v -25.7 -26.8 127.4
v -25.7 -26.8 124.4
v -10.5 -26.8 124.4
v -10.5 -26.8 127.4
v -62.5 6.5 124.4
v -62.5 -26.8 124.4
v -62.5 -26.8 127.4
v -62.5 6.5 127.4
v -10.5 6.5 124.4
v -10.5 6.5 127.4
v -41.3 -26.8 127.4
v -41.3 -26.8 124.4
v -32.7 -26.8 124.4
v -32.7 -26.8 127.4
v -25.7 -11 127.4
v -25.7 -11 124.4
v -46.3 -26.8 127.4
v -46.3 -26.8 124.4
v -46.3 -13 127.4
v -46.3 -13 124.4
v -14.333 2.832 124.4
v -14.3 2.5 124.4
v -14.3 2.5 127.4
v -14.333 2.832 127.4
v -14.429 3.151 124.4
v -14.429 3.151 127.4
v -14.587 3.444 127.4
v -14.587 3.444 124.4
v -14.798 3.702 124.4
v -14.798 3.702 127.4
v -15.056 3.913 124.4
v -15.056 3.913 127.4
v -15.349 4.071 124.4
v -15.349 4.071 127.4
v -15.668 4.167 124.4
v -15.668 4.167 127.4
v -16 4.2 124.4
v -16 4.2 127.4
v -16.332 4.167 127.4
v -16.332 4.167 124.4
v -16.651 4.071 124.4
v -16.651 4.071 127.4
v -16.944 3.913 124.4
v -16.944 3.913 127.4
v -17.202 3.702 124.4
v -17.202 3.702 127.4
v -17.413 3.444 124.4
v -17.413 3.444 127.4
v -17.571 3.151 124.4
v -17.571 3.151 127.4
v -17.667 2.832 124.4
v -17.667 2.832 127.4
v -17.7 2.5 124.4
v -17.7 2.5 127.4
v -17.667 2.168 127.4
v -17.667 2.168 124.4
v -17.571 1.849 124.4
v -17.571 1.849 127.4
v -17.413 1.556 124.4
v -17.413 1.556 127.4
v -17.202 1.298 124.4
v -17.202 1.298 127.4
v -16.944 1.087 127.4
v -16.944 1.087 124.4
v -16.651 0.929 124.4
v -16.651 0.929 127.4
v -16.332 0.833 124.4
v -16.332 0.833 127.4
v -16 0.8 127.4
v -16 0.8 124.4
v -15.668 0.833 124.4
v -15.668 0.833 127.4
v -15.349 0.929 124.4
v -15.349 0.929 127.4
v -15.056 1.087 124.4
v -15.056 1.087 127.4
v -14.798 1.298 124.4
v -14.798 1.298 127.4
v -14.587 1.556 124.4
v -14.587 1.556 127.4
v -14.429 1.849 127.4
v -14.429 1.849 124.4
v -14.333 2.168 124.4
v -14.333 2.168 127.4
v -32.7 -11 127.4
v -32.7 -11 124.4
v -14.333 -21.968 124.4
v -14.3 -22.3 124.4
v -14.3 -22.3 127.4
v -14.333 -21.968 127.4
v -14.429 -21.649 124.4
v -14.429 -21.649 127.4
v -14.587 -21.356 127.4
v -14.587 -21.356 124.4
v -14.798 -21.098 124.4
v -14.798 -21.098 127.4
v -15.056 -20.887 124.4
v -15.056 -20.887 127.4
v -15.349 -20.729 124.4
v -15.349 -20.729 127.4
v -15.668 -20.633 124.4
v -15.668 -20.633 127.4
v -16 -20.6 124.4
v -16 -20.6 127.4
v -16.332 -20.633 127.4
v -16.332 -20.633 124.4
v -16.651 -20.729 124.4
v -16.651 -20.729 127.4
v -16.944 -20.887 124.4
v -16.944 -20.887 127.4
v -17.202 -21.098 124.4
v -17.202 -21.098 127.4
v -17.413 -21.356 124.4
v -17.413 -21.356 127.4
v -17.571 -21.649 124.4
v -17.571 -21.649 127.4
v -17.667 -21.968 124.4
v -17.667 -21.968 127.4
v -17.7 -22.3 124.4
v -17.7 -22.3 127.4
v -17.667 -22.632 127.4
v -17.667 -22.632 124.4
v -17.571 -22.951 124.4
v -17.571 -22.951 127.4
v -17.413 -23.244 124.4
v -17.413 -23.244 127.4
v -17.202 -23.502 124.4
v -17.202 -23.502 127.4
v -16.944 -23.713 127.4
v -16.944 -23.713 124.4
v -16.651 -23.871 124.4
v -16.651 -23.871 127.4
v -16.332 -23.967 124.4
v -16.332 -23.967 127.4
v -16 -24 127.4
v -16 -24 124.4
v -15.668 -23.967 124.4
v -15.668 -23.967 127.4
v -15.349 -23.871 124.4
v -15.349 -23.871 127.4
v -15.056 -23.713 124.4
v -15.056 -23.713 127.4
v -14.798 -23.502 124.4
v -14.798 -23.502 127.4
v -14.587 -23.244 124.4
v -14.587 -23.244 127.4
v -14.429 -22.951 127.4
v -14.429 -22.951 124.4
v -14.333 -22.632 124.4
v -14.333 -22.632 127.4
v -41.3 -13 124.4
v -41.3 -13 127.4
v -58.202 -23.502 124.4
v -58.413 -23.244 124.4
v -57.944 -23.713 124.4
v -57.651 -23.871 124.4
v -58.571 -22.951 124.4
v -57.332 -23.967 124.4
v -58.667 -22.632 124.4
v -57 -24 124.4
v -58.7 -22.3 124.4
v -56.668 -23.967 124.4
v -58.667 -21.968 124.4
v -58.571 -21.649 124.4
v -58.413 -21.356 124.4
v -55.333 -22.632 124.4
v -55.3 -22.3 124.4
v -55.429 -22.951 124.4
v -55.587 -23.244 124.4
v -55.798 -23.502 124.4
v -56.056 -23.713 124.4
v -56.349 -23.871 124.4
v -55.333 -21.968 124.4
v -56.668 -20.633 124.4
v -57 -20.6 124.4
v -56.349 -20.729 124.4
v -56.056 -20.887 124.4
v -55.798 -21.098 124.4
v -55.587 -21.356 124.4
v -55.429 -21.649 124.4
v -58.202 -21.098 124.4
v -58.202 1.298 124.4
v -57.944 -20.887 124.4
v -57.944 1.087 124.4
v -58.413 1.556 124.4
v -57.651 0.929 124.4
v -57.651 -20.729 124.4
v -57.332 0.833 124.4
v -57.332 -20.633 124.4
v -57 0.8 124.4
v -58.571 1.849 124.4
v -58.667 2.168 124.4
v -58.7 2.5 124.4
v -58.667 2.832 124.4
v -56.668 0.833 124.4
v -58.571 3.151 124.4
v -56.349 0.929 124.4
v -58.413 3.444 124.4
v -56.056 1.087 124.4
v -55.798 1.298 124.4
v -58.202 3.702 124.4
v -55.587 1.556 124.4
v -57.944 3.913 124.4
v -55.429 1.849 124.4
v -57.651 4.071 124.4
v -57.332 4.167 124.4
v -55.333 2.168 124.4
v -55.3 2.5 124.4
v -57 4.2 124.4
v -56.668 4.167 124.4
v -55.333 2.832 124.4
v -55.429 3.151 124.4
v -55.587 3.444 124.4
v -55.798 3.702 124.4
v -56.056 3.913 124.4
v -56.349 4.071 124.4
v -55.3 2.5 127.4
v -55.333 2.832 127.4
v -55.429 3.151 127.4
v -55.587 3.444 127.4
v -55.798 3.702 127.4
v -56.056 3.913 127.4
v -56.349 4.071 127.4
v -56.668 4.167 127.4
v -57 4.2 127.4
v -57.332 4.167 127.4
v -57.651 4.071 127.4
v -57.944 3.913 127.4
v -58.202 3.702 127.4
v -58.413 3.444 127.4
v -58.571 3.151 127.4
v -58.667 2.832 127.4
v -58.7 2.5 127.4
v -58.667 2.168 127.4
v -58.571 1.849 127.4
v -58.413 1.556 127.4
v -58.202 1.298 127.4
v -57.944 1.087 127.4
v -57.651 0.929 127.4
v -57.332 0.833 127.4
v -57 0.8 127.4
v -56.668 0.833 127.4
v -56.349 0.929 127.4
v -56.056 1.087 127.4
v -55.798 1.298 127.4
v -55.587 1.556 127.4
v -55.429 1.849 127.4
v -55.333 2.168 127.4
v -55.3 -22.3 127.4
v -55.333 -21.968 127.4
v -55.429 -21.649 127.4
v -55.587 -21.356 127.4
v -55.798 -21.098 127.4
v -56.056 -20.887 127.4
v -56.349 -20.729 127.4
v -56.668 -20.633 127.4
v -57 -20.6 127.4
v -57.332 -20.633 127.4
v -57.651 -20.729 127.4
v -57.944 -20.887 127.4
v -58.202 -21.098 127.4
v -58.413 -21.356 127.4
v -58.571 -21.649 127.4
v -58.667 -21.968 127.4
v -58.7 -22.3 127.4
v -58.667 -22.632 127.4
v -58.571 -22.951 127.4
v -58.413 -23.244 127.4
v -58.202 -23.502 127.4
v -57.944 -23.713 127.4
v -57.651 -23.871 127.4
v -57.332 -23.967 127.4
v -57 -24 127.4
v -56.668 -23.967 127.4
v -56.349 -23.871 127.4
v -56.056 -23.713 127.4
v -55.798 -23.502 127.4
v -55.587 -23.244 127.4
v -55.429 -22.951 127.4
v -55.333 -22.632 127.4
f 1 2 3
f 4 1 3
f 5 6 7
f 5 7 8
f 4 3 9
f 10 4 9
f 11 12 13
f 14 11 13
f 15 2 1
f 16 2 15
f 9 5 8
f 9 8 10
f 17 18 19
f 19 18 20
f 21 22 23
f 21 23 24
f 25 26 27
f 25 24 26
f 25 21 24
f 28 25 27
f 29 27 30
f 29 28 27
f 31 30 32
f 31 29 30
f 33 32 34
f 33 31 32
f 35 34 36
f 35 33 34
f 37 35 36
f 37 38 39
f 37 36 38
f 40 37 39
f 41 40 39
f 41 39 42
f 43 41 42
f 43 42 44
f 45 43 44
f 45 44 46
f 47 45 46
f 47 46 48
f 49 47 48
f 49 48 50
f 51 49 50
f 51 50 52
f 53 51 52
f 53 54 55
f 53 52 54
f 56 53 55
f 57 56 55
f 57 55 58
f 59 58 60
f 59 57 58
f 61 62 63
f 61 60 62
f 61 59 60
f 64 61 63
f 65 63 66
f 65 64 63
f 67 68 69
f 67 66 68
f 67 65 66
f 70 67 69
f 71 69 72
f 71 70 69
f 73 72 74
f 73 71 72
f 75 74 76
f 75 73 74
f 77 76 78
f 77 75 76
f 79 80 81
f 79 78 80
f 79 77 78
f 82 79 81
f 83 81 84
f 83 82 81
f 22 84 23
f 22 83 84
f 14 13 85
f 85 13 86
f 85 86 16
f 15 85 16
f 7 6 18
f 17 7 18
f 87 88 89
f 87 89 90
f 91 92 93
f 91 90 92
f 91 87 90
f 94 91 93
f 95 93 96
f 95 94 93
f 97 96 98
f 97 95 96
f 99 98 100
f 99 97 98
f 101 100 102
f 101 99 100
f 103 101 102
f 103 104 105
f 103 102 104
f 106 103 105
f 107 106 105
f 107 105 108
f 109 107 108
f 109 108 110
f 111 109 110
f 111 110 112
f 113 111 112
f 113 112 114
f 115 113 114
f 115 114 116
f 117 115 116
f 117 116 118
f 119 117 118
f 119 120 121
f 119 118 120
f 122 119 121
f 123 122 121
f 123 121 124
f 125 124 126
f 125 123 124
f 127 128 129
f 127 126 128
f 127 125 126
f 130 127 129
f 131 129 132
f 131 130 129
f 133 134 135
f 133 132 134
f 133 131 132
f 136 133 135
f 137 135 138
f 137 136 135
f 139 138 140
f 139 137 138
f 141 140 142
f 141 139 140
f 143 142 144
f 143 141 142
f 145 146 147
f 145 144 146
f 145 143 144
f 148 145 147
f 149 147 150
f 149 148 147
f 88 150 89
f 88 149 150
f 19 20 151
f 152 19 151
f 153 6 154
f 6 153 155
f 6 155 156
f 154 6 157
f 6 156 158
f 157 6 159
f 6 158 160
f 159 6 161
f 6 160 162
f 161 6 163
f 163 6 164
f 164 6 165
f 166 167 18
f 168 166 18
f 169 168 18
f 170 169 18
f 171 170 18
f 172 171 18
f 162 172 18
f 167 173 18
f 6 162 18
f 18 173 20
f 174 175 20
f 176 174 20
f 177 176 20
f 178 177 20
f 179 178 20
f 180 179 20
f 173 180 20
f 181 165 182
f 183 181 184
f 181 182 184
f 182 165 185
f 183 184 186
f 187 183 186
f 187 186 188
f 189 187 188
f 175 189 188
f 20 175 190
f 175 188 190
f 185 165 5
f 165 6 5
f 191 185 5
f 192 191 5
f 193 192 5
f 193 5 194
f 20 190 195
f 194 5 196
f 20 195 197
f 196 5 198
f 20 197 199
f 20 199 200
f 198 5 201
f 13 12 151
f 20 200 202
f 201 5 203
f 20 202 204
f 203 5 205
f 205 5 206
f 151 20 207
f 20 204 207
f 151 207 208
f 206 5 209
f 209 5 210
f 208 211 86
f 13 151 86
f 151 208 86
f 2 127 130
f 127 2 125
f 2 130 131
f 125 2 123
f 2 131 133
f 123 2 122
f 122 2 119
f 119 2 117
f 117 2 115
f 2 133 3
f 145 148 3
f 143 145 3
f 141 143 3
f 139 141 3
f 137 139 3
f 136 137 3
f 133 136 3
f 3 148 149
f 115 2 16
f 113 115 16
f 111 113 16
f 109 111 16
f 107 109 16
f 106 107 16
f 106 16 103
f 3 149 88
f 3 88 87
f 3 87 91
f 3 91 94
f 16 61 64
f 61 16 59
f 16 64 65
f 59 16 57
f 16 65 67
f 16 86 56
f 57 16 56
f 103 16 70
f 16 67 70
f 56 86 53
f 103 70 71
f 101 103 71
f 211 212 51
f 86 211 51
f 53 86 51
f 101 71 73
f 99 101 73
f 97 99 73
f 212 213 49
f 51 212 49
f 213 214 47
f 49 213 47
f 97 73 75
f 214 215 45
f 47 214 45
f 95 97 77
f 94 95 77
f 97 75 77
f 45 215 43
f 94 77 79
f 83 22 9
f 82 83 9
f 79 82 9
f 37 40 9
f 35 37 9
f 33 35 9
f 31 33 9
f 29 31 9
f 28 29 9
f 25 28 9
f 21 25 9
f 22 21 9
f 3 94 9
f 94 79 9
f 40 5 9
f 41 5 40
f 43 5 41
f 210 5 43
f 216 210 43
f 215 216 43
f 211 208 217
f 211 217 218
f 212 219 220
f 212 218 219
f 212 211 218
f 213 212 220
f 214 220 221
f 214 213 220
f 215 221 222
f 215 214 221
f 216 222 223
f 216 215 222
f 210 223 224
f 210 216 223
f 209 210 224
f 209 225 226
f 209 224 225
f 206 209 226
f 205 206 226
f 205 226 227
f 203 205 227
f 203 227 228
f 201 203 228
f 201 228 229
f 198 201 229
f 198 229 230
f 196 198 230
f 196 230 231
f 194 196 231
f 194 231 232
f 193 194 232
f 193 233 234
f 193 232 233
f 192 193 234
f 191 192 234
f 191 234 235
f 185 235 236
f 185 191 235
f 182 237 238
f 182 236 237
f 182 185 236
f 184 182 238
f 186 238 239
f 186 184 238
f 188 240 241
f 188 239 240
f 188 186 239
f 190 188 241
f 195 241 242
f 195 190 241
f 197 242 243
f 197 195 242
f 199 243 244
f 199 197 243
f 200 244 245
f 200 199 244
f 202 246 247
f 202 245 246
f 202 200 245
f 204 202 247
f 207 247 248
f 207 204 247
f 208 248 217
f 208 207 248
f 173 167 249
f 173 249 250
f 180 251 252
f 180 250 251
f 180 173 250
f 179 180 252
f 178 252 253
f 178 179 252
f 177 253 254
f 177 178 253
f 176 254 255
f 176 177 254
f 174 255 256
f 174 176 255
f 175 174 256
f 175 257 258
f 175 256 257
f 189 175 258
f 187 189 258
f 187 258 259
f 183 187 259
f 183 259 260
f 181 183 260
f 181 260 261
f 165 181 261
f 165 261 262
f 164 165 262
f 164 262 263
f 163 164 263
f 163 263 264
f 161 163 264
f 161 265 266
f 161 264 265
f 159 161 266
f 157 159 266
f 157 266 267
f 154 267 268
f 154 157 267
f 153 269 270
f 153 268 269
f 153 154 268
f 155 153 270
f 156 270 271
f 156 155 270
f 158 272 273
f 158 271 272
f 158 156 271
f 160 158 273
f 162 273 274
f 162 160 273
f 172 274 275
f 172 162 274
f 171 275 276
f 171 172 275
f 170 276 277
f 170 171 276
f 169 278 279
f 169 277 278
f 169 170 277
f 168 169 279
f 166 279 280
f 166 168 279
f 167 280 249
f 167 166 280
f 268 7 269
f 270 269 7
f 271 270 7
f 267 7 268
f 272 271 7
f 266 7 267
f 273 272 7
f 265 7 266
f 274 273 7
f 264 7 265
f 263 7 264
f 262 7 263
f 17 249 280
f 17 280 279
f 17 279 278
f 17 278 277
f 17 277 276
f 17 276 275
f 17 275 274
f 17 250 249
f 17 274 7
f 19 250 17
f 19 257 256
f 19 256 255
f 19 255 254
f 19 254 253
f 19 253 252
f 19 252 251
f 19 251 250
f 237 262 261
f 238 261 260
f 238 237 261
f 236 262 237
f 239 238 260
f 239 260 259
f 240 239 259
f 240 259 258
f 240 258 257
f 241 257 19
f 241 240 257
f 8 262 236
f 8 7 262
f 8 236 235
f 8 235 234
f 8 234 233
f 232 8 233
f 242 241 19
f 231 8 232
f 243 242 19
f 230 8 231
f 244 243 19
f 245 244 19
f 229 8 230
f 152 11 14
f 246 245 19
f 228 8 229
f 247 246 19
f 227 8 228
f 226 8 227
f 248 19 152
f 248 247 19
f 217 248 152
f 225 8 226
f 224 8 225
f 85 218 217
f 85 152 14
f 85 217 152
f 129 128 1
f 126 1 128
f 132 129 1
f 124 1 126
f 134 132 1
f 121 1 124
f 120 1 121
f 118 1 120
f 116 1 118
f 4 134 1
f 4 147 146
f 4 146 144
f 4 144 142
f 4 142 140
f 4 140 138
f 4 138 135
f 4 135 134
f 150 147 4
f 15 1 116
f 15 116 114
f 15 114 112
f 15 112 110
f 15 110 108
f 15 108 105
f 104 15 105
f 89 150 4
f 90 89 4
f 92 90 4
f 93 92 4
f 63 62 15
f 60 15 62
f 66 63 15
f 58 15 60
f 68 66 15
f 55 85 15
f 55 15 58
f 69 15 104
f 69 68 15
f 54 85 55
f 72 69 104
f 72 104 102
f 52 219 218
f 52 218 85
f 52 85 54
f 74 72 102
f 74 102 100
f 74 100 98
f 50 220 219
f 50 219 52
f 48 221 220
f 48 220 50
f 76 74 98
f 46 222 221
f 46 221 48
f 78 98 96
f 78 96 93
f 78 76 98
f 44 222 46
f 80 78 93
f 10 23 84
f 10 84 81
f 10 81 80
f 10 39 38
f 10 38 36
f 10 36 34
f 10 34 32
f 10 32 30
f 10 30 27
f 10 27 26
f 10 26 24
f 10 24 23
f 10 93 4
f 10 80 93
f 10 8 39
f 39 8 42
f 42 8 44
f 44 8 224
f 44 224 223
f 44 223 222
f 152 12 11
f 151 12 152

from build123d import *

# Parameters (mm, degrees)
SKETCH1_W           = 52
SKETCH1_H           = 33.3
COVER_PLATE_DEPTH   = 3
SKETCH2_W           = 5
SKETCH2_H           = 14.8
SKETCH2_W_2         = 7
SKETCH2_H_2         = 16.8
CABLE_NOTCHES_DEPTH = 5
SKETCH3_R           = 1.7
SCREW_HOLES_DEPTH   = 5


with BuildPart() as part:
    # Sketch1 → Cover Plate (new body)
    with BuildSketch(Plane.XY.offset(124.4)):
        with Locations((-36.5, -10.15)):
            Rectangle(SKETCH1_W, SKETCH1_H)
    extrude(amount=COVER_PLATE_DEPTH)

    # Sketch2 → Cable Notches (cut)
    with BuildSketch(Plane.XY.offset(123.4)):
        with Locations((-43.8, -20.4)):
            Rectangle(SKETCH2_W, SKETCH2_H)
        with Locations((-29.2, -19.4)):
            Rectangle(SKETCH2_W_2, SKETCH2_H_2)
    extrude(amount=CABLE_NOTCHES_DEPTH, mode=Mode.SUBTRACT)

    # Sketch3 → Screw Holes (cut)
    with BuildSketch(Plane.XY.offset(123.4)):
        with Locations((-57, -22.3)):
            Circle(SKETCH3_R)
        with Locations((-57, 2.5)):
            Circle(SKETCH3_R)
        with Locations((-16, -22.3)):
            Circle(SKETCH3_R)
        with Locations((-16, 2.5)):
            Circle(SKETCH3_R)
    extrude(amount=SCREW_HOLES_DEPTH, mode=Mode.SUBTRACT)


solid = part.part
